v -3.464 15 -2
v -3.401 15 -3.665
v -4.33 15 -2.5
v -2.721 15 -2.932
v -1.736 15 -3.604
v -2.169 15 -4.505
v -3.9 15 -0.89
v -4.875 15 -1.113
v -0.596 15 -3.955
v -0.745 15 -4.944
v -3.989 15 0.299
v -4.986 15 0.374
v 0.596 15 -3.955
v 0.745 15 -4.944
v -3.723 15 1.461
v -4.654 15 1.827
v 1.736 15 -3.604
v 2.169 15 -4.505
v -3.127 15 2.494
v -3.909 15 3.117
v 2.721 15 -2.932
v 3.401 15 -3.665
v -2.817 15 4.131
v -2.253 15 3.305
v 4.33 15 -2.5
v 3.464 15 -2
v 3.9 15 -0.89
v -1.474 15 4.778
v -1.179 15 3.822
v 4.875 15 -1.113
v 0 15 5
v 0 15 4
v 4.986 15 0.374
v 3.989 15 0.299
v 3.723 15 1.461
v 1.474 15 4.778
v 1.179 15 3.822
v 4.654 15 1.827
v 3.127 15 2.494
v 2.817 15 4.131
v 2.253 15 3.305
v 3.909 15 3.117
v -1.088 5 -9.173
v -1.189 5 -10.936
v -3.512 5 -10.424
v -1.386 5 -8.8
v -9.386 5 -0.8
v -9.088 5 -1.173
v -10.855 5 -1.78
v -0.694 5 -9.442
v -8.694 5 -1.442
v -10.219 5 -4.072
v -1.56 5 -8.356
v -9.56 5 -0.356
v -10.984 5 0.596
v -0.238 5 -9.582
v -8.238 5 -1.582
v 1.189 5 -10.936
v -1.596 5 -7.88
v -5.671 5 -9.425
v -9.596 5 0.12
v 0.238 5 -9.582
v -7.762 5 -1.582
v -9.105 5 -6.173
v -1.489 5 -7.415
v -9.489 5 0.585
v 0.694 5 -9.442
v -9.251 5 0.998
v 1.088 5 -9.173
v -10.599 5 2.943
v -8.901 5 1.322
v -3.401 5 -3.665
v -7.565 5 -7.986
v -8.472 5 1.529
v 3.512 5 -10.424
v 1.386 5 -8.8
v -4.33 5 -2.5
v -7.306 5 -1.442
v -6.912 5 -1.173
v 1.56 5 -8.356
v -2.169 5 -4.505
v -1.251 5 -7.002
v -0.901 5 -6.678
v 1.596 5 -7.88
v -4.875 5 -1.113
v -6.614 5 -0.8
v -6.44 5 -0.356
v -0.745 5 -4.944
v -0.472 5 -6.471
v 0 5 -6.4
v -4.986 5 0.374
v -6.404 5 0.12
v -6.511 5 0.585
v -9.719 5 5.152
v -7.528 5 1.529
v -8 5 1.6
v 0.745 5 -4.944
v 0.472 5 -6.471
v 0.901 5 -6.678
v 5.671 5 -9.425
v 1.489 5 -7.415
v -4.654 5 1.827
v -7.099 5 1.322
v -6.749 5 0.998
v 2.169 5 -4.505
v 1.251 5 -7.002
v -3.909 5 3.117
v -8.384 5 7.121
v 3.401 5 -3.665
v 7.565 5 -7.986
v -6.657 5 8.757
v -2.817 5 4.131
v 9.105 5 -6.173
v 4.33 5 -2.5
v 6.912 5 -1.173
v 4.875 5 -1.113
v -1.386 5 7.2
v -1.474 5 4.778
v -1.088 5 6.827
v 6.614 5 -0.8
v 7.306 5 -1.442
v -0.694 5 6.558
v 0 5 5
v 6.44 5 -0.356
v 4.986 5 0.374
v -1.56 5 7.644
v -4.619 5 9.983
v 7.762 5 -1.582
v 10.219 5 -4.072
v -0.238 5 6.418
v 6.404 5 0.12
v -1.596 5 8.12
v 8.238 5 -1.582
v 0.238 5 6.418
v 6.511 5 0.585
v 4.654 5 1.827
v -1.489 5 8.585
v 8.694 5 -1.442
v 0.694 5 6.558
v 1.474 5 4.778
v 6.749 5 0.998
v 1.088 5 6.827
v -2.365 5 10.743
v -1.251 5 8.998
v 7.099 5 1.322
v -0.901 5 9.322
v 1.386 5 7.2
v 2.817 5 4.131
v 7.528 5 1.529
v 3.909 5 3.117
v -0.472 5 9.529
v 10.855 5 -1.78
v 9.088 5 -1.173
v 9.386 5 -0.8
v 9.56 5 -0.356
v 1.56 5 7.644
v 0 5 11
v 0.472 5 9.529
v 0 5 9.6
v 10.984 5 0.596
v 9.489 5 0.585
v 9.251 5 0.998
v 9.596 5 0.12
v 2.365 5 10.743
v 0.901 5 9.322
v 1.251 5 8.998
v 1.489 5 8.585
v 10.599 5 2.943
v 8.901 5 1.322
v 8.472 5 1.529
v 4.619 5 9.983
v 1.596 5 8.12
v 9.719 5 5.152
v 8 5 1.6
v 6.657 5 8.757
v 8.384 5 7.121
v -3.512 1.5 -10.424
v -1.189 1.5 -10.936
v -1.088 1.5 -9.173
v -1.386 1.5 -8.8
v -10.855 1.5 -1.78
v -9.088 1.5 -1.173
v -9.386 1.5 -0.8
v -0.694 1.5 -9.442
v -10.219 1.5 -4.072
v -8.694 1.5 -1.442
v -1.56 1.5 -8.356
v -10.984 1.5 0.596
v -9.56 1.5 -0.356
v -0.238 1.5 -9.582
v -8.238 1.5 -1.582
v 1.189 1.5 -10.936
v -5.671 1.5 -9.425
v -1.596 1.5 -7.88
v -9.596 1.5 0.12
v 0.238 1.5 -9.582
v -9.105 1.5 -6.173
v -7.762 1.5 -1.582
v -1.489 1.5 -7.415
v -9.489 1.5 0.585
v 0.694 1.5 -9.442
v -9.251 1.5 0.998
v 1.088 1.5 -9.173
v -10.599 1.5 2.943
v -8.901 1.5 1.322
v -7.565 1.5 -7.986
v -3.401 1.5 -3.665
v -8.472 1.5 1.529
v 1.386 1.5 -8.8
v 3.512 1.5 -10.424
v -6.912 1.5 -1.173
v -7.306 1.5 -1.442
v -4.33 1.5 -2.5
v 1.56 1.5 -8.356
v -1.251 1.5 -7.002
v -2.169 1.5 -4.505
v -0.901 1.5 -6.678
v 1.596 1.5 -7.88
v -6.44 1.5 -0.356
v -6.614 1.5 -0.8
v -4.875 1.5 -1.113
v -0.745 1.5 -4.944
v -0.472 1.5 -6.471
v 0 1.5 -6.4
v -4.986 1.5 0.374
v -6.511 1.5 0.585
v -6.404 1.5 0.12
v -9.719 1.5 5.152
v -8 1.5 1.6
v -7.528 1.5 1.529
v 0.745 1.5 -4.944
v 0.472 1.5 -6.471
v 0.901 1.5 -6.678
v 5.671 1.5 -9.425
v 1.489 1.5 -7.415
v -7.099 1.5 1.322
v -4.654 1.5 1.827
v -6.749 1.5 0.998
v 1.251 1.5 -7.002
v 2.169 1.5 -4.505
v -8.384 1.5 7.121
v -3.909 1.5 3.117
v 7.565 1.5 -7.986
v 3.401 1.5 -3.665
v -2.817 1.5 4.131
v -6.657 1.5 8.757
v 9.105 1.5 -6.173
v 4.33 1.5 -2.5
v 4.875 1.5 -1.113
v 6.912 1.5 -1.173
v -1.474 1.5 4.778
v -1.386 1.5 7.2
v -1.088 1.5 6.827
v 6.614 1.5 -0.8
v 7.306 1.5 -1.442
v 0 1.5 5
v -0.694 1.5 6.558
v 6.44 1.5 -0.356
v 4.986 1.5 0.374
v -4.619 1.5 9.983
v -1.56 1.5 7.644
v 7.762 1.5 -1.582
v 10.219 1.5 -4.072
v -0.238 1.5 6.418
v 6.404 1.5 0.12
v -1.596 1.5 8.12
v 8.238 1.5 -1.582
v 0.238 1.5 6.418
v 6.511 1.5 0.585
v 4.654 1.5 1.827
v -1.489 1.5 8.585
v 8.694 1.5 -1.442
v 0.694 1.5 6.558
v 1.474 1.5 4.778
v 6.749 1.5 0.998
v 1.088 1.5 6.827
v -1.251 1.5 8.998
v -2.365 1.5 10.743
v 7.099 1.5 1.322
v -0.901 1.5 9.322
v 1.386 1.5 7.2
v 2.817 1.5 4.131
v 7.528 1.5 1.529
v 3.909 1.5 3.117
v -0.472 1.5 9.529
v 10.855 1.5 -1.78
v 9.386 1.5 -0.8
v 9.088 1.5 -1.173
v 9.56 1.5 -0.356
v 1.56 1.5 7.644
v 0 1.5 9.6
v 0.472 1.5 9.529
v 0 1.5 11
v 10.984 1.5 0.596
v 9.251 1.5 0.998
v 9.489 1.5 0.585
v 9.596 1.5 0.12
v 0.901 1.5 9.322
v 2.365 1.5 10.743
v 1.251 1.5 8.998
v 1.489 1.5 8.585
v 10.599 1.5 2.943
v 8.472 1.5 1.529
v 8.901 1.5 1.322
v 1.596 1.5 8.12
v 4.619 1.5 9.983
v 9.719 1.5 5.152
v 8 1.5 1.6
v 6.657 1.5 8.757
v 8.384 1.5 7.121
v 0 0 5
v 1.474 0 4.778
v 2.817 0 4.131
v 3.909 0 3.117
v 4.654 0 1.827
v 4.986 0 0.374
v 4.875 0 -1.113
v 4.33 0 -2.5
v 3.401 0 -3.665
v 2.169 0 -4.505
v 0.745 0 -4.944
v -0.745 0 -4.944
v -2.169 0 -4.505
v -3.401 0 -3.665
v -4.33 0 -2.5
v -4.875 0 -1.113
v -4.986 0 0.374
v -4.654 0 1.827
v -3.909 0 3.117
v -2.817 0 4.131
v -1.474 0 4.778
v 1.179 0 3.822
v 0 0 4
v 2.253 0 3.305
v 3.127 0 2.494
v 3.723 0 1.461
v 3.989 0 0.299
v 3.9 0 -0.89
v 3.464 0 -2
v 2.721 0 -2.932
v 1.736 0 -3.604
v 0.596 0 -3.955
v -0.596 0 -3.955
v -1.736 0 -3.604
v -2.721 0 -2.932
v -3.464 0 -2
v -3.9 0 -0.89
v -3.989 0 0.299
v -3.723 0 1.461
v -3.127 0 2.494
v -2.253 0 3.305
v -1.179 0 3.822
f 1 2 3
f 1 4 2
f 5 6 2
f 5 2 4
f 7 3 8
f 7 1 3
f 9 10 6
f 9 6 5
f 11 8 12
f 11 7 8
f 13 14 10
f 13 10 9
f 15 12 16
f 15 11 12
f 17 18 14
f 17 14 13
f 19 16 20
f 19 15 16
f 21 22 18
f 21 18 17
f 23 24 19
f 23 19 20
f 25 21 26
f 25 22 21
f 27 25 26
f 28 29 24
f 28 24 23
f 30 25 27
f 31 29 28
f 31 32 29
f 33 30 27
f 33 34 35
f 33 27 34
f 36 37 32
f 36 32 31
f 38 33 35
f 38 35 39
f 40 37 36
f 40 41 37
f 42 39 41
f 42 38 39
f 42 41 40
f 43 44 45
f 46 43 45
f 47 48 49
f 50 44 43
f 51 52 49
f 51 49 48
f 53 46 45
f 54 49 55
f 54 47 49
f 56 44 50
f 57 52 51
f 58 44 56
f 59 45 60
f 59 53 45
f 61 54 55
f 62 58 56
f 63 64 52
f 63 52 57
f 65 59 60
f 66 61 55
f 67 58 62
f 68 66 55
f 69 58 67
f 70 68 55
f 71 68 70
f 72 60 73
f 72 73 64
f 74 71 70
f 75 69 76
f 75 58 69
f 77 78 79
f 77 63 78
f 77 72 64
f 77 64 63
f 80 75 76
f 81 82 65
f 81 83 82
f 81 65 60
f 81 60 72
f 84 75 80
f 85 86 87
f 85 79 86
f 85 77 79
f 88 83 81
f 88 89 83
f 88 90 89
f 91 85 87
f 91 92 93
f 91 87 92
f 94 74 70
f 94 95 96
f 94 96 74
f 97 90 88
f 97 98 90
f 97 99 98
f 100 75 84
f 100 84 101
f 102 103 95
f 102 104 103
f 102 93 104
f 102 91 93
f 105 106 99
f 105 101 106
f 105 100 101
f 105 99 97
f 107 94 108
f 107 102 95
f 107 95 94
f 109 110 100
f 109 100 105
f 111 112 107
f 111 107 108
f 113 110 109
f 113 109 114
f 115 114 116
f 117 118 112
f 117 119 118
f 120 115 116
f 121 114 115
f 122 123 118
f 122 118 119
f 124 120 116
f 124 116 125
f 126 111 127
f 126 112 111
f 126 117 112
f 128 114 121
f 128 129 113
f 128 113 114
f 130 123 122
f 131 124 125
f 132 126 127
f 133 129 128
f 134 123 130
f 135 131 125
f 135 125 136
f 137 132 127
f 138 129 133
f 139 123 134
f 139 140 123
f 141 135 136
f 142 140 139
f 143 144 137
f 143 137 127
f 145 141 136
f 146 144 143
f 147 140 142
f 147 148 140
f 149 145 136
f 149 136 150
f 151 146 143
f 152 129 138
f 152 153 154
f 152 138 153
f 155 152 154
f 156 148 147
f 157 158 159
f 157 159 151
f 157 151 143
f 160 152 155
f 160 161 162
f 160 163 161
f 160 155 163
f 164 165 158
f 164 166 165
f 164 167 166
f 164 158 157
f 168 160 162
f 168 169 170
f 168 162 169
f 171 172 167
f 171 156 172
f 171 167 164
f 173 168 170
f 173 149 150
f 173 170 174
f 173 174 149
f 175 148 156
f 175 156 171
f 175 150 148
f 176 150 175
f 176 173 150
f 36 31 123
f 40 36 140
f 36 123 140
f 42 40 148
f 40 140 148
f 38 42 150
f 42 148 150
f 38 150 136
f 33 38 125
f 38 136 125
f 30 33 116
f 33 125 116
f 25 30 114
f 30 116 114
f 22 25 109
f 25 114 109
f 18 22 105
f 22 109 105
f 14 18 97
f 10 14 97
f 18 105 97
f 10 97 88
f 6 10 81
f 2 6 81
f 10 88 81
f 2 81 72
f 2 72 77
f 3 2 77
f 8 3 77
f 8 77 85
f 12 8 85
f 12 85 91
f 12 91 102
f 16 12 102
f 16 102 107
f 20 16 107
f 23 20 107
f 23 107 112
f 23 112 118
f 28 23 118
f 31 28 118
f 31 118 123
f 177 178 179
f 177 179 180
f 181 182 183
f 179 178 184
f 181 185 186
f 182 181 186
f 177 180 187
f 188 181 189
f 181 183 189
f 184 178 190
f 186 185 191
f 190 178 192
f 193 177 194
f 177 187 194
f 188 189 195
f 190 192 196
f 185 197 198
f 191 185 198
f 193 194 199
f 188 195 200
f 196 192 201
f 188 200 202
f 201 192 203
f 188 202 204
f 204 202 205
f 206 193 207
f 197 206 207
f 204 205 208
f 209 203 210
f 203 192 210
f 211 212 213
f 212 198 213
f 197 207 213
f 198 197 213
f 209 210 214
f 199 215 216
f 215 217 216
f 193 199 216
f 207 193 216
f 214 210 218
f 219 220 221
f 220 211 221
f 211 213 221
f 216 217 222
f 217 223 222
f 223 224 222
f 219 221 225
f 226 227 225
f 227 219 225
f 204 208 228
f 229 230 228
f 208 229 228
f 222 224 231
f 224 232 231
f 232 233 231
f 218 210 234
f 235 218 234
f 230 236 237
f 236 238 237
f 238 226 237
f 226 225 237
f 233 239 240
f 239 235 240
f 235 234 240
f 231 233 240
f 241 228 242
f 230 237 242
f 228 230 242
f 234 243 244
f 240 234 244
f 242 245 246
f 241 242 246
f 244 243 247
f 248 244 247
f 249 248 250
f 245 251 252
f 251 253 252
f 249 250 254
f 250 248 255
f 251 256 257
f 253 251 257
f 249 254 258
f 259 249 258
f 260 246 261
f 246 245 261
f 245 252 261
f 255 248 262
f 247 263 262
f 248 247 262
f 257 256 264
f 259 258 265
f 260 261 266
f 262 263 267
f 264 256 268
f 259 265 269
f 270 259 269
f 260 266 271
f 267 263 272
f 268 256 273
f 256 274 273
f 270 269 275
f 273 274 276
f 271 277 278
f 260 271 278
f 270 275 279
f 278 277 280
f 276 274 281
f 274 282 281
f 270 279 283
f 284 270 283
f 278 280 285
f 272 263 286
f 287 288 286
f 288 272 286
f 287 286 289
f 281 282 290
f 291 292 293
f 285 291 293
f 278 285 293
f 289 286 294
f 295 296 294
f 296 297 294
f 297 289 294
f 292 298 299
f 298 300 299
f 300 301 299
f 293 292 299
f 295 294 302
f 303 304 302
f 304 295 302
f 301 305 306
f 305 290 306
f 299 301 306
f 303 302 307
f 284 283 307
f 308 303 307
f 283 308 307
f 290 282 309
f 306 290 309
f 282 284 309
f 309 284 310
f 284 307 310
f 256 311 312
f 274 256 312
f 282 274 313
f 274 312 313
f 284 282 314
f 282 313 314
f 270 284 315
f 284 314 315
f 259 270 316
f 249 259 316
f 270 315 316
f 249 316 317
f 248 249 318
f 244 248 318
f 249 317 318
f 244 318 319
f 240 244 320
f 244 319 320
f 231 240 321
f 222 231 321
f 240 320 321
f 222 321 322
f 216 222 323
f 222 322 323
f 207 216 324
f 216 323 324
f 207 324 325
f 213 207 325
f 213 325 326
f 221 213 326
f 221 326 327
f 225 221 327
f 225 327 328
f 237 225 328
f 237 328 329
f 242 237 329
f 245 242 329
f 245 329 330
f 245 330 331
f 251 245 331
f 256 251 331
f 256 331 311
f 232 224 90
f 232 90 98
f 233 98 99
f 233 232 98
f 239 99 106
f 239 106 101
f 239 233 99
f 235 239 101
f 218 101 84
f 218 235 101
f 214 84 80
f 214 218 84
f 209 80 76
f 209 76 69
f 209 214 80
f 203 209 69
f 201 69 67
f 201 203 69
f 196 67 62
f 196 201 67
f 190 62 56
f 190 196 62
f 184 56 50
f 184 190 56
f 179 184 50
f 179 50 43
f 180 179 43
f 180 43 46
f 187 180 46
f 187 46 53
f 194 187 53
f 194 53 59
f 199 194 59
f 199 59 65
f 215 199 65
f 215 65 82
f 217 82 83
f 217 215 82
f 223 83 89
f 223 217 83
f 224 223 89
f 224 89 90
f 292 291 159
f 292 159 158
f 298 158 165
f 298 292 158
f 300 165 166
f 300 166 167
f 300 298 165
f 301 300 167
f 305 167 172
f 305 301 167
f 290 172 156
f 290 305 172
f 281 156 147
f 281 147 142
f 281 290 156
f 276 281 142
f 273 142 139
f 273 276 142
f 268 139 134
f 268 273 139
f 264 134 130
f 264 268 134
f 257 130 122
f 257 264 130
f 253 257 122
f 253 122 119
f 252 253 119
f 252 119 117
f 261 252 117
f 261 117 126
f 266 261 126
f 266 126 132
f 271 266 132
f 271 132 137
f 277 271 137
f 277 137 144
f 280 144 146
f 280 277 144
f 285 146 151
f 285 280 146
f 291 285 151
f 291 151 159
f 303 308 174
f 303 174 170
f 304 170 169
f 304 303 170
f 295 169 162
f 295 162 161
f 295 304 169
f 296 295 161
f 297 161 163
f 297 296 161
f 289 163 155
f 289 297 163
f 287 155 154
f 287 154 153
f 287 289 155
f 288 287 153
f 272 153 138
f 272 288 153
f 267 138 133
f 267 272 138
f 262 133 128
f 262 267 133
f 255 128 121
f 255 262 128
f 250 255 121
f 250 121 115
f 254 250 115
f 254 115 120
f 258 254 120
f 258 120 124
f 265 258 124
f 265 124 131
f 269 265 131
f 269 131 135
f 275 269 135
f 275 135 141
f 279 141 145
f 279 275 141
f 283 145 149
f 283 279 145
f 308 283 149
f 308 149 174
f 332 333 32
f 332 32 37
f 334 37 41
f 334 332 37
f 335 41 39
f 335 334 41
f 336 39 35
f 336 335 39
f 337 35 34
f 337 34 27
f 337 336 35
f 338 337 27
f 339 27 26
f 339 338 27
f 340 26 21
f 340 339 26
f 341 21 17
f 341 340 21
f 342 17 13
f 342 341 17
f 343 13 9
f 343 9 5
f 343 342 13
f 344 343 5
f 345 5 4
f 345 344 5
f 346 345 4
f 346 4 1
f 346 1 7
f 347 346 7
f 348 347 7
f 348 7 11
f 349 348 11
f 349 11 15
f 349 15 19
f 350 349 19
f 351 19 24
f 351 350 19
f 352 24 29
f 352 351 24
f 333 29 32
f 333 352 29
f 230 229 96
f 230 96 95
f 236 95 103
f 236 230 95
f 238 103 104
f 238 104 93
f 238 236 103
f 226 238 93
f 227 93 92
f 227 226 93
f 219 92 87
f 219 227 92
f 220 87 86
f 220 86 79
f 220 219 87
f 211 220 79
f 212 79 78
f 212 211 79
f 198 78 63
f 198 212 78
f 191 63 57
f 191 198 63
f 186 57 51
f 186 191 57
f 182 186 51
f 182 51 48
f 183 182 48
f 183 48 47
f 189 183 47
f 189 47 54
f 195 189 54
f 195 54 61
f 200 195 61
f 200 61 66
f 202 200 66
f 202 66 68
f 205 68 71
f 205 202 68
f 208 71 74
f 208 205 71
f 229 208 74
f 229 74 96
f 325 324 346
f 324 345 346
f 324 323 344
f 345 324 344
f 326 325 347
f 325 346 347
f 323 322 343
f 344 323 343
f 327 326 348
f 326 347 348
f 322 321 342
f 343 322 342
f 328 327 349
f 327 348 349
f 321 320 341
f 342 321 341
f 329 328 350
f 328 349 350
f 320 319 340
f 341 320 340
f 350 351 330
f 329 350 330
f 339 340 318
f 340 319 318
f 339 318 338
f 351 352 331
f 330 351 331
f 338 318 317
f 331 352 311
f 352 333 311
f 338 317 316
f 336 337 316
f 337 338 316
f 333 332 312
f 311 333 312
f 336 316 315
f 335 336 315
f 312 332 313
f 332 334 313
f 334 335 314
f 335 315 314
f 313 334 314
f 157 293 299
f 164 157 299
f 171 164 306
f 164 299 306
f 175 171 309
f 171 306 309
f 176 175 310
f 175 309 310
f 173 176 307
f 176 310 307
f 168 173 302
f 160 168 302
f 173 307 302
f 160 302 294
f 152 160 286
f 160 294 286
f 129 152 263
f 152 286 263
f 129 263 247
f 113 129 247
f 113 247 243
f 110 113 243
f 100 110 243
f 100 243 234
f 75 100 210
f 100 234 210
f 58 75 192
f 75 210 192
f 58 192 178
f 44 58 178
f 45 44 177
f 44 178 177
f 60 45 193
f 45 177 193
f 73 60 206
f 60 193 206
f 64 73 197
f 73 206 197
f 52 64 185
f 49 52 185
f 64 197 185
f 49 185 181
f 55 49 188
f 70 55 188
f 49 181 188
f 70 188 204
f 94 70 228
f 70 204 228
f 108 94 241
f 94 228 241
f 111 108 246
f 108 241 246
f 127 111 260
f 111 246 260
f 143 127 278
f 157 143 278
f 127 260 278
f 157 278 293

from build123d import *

# Parameters (mm, degrees)
SKETCH_1_R      = 5
SKETCH_1_R_2    = 4
EXTRUDE_1_DEPTH = 15
EXTRUDE_START   = 1.5
SKETCH_2_R      = 11
SKETCH_2_R_2    = 5
SKETCH_2_R_3    = 1.6
EXTRUDE_2_DEPTH = 3.5


with BuildPart() as part:
    # 草图1 → 凸台-拉伸1 (new body)
    with BuildSketch(Plane(origin=(0, 0, 0), x_dir=(1, 0, 0), z_dir=(0, 1, 0))):
        with Locations(Location((0, 0, 0), (0, 0, 270))):
            Circle(SKETCH_1_R)
        with Locations(Location((0, 0, 0), (0, 0, 270))):
            Circle(SKETCH_1_R_2, mode=Mode.SUBTRACT)
    extrude(amount=EXTRUDE_1_DEPTH)

    # 草图2 → 凸台-拉伸2 (add)
    with BuildSketch(Plane(origin=(0, 0, 0), x_dir=(1, 0, 0), z_dir=(0, 1, 0)).offset(EXTRUDE_START)):
        with Locations(Location((0, 0, 0), (0, 0, 270))):
            Circle(SKETCH_2_R)
        with Locations(Location((0, 0, 0), (0, 0, 270))):
            Circle(SKETCH_2_R_2, mode=Mode.SUBTRACT)
        with Locations(Location((0, 8, 0), (0, 0, 270))):
            Circle(SKETCH_2_R_3, mode=Mode.SUBTRACT)
        with Locations(Location((8, 0, 0), (0, 0, 270))):
            Circle(SKETCH_2_R_3, mode=Mode.SUBTRACT)
        with Locations(Location((0, -8, 0), (0, 0, 270))):
            Circle(SKETCH_2_R_3, mode=Mode.SUBTRACT)
        with Locations(Location((-8, 0, 0), (0, 0, 270))):
            Circle(SKETCH_2_R_3, mode=Mode.SUBTRACT)
    extrude(amount=EXTRUDE_2_DEPTH)


solid = part.part
